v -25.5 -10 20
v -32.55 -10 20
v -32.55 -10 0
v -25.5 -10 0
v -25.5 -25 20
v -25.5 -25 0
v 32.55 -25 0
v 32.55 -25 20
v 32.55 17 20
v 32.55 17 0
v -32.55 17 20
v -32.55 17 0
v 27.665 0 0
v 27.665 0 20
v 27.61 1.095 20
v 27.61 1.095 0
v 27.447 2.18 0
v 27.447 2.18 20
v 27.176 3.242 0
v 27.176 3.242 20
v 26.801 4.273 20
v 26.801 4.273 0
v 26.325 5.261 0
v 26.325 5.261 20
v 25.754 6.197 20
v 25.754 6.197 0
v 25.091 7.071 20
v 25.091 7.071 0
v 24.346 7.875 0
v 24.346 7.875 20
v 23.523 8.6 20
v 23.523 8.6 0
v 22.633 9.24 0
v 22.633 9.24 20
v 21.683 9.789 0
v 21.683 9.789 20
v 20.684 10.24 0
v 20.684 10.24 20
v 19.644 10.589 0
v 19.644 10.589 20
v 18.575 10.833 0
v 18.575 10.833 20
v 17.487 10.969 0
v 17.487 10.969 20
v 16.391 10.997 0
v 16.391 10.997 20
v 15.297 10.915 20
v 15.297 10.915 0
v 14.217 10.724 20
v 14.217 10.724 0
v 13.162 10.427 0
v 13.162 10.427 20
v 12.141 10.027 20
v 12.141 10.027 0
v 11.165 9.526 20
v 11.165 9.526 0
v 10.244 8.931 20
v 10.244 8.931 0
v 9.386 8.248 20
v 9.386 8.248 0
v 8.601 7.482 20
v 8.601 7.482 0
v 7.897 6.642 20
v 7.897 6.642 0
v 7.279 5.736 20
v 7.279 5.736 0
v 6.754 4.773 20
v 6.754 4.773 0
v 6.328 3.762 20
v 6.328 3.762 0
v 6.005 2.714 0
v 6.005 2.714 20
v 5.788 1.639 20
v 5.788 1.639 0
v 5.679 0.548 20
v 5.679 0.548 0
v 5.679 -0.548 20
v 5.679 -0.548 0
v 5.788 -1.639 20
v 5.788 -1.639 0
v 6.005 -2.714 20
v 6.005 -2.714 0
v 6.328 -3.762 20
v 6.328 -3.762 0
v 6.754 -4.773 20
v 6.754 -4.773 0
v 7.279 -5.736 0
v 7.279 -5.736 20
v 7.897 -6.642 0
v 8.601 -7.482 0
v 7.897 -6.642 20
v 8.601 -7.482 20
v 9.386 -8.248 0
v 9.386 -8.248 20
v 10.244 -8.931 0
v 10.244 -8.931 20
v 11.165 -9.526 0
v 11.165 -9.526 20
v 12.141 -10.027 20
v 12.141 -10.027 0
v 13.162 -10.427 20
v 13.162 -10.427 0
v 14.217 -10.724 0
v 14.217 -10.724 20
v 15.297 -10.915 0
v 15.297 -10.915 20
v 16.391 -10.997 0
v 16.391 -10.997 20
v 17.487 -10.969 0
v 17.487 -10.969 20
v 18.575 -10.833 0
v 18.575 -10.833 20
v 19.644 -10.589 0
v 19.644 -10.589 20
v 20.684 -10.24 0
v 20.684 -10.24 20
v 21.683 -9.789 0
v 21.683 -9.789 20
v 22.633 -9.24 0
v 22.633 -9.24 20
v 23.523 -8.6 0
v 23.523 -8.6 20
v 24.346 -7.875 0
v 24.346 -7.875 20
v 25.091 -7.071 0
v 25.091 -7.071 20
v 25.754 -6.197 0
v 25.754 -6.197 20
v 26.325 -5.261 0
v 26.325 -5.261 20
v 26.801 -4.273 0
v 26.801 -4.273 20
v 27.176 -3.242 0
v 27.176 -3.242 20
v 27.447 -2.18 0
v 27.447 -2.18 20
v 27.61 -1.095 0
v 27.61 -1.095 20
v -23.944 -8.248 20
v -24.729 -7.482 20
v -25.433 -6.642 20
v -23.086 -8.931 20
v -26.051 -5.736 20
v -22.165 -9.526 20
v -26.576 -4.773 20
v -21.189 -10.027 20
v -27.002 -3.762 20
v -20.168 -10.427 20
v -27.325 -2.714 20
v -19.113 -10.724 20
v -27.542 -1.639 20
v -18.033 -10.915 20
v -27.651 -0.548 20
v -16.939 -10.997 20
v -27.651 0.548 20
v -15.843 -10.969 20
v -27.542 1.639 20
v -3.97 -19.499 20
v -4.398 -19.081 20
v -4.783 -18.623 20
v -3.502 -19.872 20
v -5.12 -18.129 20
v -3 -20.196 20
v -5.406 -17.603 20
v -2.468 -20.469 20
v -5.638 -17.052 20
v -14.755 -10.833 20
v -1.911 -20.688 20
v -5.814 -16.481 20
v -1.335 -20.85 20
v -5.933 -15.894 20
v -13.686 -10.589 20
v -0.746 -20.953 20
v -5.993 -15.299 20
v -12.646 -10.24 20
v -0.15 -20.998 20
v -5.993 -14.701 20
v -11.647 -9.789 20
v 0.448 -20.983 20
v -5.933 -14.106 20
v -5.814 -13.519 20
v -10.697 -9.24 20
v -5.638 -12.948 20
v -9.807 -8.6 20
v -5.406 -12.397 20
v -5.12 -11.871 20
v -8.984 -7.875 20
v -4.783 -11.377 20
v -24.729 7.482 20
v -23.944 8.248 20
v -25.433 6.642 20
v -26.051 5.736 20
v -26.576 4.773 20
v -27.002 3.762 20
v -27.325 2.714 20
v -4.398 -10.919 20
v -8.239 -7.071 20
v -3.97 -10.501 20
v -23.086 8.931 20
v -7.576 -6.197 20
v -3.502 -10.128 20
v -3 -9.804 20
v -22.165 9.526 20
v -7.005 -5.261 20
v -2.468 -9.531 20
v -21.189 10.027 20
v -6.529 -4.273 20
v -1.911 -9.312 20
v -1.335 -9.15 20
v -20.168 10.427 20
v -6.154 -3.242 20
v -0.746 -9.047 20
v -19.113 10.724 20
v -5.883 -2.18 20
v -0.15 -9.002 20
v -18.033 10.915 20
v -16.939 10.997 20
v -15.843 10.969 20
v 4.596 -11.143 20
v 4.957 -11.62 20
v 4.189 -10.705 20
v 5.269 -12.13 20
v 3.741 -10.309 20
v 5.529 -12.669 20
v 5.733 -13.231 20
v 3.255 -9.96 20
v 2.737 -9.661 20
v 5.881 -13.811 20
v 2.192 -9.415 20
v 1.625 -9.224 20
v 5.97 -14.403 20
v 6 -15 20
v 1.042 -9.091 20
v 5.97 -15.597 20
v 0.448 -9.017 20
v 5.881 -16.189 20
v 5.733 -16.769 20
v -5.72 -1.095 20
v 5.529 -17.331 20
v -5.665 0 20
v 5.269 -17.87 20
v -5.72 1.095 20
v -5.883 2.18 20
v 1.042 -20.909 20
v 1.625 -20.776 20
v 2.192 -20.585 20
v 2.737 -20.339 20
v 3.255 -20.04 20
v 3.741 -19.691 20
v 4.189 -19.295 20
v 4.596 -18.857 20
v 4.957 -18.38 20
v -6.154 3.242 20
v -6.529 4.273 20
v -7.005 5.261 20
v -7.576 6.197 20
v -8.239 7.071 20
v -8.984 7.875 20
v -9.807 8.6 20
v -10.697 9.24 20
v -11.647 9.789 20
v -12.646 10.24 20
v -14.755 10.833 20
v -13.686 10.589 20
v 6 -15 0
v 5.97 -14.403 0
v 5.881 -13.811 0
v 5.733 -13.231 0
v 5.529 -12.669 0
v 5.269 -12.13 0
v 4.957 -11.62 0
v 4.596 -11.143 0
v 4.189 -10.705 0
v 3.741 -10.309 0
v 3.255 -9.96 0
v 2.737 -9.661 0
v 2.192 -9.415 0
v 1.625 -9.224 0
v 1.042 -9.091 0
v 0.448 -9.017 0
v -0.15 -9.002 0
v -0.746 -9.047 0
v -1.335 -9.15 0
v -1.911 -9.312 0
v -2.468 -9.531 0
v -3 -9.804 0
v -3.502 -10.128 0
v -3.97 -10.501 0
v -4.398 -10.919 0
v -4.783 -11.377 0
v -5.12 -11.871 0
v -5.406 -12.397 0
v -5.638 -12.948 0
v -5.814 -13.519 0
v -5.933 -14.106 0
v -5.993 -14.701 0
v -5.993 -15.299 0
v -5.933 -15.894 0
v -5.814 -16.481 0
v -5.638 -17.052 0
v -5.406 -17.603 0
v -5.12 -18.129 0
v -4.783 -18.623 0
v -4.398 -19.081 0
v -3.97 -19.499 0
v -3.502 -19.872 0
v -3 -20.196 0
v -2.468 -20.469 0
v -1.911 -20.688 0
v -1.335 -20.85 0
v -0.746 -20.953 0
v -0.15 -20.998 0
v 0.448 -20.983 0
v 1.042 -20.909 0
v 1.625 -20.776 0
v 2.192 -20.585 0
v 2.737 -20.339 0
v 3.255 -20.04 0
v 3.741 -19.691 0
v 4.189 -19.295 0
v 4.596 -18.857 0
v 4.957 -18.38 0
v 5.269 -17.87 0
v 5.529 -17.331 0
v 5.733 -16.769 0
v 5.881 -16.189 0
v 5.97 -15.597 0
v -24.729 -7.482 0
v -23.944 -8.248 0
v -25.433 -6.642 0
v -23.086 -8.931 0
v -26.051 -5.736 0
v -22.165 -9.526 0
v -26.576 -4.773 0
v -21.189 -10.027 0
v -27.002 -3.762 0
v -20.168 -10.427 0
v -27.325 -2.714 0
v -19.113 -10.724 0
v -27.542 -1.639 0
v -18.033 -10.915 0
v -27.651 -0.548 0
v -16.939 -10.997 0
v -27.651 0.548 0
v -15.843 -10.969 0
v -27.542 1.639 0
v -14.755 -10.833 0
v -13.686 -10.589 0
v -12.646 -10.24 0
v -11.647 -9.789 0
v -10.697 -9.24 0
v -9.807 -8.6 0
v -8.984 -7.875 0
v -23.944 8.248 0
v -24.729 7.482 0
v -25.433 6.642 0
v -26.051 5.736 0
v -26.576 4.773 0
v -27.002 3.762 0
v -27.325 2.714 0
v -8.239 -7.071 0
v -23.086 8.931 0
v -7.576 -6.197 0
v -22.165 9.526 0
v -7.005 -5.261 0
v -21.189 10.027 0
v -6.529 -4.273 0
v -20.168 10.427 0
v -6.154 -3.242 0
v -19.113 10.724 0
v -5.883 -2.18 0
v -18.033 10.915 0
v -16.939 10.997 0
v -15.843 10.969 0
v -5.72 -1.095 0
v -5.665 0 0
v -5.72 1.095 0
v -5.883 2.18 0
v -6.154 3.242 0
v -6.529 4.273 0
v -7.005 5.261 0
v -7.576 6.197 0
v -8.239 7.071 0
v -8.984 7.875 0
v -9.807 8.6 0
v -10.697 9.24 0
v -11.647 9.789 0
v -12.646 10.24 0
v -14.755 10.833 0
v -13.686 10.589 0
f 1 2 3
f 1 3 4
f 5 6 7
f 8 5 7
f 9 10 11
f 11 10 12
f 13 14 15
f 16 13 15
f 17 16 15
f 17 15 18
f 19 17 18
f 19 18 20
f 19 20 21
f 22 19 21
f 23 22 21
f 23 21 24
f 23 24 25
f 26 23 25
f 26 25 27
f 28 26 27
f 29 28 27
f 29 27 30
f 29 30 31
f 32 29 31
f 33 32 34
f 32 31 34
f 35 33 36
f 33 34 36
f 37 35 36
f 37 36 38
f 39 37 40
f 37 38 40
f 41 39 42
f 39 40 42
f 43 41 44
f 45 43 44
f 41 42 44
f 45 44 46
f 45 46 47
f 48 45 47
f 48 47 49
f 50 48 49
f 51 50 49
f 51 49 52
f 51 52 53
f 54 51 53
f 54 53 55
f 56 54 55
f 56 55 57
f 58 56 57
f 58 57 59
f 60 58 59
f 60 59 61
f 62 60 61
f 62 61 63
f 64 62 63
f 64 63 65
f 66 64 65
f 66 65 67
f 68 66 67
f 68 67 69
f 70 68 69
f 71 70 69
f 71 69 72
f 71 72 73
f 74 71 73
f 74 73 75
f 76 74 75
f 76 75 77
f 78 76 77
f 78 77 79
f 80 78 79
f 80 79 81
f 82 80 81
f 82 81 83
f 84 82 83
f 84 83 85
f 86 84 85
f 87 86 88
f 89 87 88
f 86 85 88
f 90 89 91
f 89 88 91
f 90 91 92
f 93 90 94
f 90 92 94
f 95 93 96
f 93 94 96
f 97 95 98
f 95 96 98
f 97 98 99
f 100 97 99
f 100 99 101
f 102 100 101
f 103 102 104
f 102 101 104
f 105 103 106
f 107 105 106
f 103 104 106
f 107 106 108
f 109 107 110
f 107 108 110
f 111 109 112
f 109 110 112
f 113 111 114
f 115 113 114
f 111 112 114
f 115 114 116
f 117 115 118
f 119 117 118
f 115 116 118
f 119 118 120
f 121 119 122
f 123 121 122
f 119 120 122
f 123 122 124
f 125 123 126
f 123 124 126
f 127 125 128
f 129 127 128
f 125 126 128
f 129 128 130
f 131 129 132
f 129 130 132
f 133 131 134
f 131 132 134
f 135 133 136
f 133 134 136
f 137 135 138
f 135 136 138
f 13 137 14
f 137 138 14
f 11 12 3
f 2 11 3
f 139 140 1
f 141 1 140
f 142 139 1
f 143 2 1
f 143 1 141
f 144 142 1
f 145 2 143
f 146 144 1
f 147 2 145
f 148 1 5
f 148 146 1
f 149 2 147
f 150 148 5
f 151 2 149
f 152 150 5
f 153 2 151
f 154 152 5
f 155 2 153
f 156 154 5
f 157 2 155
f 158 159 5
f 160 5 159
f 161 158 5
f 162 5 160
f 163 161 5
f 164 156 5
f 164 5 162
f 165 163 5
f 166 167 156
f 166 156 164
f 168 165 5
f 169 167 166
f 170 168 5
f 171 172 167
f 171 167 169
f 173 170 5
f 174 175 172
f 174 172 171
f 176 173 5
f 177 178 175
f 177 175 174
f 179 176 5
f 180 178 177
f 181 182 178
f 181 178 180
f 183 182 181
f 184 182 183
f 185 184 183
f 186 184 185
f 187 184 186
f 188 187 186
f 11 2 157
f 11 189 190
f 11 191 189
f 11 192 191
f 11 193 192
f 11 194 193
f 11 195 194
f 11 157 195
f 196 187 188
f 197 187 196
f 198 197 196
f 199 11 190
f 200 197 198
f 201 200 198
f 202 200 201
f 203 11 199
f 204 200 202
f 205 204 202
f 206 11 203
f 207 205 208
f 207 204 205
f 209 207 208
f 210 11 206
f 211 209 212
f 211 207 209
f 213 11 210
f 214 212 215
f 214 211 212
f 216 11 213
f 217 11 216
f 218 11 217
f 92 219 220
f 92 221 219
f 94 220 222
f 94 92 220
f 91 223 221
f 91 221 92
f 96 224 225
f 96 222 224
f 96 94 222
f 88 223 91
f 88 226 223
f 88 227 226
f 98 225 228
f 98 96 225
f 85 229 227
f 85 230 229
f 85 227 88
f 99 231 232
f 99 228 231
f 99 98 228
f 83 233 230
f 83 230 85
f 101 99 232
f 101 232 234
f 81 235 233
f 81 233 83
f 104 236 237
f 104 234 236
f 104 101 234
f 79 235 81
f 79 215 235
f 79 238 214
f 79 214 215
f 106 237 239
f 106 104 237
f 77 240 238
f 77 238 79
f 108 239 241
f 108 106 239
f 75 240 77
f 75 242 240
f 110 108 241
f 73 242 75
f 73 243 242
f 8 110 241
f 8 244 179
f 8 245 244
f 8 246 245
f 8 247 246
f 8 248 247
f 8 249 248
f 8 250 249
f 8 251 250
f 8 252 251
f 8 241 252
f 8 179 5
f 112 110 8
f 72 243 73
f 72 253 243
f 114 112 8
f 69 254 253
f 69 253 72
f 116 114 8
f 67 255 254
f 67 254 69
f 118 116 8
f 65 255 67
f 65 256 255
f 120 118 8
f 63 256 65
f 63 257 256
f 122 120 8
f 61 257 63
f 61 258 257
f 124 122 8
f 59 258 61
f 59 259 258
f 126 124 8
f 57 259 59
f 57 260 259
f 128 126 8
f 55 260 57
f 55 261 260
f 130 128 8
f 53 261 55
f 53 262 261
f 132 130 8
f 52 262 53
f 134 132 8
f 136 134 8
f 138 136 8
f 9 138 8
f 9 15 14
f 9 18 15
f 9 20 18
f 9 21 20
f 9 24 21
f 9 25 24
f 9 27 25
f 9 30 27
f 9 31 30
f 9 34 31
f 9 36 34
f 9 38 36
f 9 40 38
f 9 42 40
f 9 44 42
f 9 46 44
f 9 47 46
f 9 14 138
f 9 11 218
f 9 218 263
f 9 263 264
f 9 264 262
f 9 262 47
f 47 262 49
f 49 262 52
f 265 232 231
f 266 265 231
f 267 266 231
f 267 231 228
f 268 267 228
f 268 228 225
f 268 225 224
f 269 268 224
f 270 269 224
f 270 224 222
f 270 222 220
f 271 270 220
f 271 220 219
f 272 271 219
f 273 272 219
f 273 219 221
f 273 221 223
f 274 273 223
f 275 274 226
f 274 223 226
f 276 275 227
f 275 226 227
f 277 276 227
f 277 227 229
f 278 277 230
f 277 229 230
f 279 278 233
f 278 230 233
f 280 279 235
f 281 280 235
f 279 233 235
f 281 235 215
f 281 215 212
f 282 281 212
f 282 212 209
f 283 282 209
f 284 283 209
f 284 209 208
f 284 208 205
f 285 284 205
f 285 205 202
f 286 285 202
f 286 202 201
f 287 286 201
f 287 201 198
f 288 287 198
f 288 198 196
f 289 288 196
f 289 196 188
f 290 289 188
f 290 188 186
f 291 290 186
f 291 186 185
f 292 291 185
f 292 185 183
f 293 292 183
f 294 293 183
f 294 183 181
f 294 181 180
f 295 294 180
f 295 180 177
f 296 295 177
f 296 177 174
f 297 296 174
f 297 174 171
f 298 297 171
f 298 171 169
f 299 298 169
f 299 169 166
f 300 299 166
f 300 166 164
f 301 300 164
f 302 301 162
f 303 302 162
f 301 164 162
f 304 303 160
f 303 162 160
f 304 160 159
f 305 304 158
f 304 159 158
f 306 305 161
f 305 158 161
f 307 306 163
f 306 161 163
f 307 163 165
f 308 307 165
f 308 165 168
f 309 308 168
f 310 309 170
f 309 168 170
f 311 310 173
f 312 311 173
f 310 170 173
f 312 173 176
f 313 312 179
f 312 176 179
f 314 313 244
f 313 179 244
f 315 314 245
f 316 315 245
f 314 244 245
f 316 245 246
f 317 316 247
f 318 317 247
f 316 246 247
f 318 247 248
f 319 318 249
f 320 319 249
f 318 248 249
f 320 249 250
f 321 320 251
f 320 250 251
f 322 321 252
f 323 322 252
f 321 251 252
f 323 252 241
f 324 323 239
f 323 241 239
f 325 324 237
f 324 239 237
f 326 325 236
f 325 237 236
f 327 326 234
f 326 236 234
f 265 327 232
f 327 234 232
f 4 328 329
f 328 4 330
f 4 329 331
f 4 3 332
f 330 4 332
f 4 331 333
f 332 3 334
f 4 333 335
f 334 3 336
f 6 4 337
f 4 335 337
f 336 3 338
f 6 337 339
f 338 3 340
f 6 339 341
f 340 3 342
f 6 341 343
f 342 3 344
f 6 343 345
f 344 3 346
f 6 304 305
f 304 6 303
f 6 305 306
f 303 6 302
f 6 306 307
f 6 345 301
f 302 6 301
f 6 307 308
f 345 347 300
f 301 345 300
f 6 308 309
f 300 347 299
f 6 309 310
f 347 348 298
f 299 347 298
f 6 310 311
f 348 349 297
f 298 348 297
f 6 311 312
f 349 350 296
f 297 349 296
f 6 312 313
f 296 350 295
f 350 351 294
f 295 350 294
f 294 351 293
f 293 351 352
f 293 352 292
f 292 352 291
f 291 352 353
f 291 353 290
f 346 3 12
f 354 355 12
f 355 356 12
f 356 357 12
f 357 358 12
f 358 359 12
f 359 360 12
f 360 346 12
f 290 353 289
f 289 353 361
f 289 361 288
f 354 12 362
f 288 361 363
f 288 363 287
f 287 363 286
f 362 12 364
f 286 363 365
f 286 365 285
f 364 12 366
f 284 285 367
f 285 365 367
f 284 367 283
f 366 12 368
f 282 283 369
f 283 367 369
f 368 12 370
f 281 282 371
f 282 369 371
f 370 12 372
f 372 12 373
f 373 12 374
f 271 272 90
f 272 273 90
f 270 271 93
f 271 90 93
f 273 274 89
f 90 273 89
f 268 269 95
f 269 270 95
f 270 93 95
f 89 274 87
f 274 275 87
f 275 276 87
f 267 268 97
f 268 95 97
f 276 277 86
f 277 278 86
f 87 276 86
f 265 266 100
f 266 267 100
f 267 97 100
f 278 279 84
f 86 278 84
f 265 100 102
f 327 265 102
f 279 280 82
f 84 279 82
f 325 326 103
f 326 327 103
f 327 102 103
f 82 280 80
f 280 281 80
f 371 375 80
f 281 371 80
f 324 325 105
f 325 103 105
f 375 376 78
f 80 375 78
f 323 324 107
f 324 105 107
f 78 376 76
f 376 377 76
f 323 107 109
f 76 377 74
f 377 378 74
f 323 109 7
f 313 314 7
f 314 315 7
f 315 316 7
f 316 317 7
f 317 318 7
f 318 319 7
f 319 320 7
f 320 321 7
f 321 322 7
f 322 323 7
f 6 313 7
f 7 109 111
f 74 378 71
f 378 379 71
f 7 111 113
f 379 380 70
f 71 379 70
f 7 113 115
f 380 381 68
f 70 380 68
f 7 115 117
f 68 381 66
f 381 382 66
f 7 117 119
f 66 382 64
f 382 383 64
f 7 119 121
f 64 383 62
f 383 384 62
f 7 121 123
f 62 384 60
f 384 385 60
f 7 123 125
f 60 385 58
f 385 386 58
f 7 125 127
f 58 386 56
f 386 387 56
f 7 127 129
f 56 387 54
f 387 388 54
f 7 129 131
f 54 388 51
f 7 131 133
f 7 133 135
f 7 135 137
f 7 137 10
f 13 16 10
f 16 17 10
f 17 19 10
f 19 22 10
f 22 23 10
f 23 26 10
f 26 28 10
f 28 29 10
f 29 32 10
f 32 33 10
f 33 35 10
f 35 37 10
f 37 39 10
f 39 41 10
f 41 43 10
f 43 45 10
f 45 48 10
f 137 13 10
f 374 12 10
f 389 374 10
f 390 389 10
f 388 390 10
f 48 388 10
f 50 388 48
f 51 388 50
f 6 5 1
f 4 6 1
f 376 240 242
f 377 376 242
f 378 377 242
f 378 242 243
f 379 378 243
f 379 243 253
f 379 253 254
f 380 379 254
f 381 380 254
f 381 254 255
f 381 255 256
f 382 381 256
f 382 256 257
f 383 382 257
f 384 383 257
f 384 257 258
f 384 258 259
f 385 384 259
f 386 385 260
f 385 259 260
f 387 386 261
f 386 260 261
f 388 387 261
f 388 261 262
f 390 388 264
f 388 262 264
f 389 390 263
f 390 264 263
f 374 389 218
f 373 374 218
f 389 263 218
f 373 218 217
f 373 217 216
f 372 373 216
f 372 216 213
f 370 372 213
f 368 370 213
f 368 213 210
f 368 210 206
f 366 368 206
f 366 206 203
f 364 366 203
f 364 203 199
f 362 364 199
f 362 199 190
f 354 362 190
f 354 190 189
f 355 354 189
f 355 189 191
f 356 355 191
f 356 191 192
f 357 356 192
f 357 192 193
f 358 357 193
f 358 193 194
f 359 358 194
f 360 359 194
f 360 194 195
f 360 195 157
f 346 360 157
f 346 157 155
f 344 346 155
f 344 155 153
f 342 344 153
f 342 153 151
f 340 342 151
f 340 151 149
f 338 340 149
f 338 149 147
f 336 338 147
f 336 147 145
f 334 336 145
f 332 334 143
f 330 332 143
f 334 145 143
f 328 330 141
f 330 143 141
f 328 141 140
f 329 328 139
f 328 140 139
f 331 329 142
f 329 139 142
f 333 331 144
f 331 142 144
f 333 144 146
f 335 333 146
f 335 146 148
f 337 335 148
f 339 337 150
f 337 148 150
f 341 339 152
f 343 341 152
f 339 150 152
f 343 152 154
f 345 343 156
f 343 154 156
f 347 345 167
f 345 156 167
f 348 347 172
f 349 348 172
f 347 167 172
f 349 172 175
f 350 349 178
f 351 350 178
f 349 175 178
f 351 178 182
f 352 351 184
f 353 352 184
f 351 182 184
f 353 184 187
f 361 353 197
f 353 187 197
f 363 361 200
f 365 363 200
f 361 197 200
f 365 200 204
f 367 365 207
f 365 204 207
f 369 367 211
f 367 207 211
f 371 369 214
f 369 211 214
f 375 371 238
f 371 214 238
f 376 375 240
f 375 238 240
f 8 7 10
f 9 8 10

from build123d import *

# Parameters (mm, degrees)
PARALLELEPIPEDOBLOCCO_DEPTH  = 20
SCHIZZO2_R                   = 11
SCHIZZO2_R_2                 = 6
FORITUBIMOTORI_DEPTH         = 46.656352242
SCHIZZO3_W                   = 7.05
SCHIZZO3_H                   = 15
SPAZIOMOVIMENTOLEVETTA_DEPTH = 46.656352242


with BuildPart() as part:
    # Schizzo1 → ParallelepipedoBlocco (new body)
    with BuildSketch(Plane.XY):
        Polygon((-30.55, -25), (30.55, -25), (32.55, -25), (32.55, 17), (-32.55, 17), (-32.55, -25), align=None)
    extrude(amount=PARALLELEPIPEDOBLOCCO_DEPTH)

    # Schizzo2 → ForiTubiMotori (cut, through all)
    with BuildSketch(Plane.XY.offset(20)):
        with Locations((-16.665, 0)):
            Circle(SCHIZZO2_R)
        with Locations((16.665, 0)):
            Circle(SCHIZZO2_R)
        with Locations((0, -15)):
            Circle(SCHIZZO2_R_2)
    extrude(amount=-FORITUBIMOTORI_DEPTH, mode=Mode.SUBTRACT)

    # Schizzo3 → SpazioMovimentoLevetta (cut, through all)
    with BuildSketch(Plane.XY.offset(20)):
        with Locations((-29.025, -17.5)):
            Rectangle(SCHIZZO3_W, SCHIZZO3_H)
    extrude(amount=-SPAZIOMOVIMENTOLEVETTA_DEPTH, mode=Mode.SUBTRACT)


solid = part.part
